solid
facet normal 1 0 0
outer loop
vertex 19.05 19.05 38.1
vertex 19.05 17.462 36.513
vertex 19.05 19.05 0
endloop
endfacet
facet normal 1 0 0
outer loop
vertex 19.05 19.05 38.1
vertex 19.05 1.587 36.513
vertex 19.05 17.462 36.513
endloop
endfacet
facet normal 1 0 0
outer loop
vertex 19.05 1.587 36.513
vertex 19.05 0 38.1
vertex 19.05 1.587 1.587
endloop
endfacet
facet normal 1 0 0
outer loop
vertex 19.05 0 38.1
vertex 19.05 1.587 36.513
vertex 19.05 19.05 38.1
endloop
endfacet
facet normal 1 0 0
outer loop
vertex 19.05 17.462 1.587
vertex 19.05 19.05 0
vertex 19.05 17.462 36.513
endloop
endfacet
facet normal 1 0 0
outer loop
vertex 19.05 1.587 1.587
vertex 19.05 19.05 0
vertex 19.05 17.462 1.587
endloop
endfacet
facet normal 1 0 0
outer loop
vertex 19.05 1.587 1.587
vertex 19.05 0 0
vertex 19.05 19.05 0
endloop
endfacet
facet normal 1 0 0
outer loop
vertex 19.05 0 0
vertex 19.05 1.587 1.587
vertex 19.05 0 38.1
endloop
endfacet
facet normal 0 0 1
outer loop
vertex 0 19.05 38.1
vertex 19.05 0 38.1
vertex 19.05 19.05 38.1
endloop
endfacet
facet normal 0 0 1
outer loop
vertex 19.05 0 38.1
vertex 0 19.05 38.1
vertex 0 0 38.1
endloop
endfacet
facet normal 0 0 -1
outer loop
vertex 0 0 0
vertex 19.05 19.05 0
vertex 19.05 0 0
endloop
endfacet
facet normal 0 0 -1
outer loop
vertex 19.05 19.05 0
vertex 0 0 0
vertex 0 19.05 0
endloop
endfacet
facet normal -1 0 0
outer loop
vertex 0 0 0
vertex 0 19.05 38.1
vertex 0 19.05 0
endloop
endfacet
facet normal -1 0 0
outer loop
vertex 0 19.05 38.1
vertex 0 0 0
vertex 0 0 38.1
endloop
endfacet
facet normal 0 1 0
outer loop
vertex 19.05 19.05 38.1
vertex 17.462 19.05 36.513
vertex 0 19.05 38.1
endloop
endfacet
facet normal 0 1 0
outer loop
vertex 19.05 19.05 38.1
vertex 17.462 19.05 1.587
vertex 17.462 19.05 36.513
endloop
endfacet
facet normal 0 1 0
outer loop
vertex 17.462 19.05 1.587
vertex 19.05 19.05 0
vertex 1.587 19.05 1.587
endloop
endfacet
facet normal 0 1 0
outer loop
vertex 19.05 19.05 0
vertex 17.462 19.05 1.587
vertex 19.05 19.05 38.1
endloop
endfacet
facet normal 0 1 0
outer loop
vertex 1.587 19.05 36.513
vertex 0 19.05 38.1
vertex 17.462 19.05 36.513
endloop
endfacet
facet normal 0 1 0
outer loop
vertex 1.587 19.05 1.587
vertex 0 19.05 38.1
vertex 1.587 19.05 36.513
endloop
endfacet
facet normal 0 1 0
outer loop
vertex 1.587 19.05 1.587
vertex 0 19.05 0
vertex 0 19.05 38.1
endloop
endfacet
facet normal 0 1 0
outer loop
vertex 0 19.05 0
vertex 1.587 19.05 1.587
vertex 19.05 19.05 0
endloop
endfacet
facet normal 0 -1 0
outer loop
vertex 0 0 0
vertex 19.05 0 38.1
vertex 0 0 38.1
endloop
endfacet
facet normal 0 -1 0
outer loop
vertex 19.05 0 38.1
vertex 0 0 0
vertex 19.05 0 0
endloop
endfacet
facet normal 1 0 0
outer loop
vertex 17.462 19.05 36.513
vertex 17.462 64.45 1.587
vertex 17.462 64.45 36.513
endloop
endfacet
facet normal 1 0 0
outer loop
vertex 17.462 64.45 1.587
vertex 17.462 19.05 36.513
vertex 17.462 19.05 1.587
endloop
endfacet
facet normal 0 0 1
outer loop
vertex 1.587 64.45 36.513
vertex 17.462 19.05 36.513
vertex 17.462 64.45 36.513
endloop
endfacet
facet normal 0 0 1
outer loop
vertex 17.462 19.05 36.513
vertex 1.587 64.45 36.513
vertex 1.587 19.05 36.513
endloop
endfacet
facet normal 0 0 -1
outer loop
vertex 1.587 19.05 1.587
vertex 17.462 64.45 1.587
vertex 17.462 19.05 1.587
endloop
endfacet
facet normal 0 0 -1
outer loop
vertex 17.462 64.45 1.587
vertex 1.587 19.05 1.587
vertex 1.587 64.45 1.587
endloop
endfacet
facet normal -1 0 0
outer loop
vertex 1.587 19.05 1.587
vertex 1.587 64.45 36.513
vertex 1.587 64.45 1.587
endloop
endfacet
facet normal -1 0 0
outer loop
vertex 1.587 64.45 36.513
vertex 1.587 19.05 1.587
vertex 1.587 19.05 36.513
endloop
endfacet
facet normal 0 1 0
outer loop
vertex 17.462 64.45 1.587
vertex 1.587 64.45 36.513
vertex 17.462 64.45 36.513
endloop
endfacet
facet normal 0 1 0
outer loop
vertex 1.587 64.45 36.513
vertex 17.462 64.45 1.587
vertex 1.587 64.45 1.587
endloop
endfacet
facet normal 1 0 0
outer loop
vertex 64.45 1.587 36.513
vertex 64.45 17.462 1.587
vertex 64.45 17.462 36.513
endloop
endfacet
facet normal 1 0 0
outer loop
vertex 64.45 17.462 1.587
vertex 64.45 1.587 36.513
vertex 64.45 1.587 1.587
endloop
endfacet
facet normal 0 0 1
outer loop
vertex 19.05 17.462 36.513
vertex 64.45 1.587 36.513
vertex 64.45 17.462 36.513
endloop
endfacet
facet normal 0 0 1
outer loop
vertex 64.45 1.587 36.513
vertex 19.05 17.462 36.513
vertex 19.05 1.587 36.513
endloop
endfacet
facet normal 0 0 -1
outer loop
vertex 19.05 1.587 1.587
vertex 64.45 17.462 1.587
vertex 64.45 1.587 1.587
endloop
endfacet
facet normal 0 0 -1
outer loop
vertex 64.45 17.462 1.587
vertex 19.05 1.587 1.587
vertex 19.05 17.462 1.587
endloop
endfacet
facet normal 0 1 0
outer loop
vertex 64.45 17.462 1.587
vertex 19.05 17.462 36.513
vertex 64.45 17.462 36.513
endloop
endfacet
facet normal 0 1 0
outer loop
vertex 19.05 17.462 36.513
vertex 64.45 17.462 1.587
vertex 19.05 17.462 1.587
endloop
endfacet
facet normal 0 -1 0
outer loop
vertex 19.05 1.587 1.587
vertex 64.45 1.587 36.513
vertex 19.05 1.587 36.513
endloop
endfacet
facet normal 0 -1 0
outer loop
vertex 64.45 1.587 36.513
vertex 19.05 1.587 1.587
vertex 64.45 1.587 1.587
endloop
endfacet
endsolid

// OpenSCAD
cube([19.05,19.05,38.1]);


translate([1.5875,10,1.5875])
{
    cube([15.875,54.45,34.925]);
}


translate([10,1.5875,1.5875])
{
    cube([54.45,15.875,34.925]);
}
